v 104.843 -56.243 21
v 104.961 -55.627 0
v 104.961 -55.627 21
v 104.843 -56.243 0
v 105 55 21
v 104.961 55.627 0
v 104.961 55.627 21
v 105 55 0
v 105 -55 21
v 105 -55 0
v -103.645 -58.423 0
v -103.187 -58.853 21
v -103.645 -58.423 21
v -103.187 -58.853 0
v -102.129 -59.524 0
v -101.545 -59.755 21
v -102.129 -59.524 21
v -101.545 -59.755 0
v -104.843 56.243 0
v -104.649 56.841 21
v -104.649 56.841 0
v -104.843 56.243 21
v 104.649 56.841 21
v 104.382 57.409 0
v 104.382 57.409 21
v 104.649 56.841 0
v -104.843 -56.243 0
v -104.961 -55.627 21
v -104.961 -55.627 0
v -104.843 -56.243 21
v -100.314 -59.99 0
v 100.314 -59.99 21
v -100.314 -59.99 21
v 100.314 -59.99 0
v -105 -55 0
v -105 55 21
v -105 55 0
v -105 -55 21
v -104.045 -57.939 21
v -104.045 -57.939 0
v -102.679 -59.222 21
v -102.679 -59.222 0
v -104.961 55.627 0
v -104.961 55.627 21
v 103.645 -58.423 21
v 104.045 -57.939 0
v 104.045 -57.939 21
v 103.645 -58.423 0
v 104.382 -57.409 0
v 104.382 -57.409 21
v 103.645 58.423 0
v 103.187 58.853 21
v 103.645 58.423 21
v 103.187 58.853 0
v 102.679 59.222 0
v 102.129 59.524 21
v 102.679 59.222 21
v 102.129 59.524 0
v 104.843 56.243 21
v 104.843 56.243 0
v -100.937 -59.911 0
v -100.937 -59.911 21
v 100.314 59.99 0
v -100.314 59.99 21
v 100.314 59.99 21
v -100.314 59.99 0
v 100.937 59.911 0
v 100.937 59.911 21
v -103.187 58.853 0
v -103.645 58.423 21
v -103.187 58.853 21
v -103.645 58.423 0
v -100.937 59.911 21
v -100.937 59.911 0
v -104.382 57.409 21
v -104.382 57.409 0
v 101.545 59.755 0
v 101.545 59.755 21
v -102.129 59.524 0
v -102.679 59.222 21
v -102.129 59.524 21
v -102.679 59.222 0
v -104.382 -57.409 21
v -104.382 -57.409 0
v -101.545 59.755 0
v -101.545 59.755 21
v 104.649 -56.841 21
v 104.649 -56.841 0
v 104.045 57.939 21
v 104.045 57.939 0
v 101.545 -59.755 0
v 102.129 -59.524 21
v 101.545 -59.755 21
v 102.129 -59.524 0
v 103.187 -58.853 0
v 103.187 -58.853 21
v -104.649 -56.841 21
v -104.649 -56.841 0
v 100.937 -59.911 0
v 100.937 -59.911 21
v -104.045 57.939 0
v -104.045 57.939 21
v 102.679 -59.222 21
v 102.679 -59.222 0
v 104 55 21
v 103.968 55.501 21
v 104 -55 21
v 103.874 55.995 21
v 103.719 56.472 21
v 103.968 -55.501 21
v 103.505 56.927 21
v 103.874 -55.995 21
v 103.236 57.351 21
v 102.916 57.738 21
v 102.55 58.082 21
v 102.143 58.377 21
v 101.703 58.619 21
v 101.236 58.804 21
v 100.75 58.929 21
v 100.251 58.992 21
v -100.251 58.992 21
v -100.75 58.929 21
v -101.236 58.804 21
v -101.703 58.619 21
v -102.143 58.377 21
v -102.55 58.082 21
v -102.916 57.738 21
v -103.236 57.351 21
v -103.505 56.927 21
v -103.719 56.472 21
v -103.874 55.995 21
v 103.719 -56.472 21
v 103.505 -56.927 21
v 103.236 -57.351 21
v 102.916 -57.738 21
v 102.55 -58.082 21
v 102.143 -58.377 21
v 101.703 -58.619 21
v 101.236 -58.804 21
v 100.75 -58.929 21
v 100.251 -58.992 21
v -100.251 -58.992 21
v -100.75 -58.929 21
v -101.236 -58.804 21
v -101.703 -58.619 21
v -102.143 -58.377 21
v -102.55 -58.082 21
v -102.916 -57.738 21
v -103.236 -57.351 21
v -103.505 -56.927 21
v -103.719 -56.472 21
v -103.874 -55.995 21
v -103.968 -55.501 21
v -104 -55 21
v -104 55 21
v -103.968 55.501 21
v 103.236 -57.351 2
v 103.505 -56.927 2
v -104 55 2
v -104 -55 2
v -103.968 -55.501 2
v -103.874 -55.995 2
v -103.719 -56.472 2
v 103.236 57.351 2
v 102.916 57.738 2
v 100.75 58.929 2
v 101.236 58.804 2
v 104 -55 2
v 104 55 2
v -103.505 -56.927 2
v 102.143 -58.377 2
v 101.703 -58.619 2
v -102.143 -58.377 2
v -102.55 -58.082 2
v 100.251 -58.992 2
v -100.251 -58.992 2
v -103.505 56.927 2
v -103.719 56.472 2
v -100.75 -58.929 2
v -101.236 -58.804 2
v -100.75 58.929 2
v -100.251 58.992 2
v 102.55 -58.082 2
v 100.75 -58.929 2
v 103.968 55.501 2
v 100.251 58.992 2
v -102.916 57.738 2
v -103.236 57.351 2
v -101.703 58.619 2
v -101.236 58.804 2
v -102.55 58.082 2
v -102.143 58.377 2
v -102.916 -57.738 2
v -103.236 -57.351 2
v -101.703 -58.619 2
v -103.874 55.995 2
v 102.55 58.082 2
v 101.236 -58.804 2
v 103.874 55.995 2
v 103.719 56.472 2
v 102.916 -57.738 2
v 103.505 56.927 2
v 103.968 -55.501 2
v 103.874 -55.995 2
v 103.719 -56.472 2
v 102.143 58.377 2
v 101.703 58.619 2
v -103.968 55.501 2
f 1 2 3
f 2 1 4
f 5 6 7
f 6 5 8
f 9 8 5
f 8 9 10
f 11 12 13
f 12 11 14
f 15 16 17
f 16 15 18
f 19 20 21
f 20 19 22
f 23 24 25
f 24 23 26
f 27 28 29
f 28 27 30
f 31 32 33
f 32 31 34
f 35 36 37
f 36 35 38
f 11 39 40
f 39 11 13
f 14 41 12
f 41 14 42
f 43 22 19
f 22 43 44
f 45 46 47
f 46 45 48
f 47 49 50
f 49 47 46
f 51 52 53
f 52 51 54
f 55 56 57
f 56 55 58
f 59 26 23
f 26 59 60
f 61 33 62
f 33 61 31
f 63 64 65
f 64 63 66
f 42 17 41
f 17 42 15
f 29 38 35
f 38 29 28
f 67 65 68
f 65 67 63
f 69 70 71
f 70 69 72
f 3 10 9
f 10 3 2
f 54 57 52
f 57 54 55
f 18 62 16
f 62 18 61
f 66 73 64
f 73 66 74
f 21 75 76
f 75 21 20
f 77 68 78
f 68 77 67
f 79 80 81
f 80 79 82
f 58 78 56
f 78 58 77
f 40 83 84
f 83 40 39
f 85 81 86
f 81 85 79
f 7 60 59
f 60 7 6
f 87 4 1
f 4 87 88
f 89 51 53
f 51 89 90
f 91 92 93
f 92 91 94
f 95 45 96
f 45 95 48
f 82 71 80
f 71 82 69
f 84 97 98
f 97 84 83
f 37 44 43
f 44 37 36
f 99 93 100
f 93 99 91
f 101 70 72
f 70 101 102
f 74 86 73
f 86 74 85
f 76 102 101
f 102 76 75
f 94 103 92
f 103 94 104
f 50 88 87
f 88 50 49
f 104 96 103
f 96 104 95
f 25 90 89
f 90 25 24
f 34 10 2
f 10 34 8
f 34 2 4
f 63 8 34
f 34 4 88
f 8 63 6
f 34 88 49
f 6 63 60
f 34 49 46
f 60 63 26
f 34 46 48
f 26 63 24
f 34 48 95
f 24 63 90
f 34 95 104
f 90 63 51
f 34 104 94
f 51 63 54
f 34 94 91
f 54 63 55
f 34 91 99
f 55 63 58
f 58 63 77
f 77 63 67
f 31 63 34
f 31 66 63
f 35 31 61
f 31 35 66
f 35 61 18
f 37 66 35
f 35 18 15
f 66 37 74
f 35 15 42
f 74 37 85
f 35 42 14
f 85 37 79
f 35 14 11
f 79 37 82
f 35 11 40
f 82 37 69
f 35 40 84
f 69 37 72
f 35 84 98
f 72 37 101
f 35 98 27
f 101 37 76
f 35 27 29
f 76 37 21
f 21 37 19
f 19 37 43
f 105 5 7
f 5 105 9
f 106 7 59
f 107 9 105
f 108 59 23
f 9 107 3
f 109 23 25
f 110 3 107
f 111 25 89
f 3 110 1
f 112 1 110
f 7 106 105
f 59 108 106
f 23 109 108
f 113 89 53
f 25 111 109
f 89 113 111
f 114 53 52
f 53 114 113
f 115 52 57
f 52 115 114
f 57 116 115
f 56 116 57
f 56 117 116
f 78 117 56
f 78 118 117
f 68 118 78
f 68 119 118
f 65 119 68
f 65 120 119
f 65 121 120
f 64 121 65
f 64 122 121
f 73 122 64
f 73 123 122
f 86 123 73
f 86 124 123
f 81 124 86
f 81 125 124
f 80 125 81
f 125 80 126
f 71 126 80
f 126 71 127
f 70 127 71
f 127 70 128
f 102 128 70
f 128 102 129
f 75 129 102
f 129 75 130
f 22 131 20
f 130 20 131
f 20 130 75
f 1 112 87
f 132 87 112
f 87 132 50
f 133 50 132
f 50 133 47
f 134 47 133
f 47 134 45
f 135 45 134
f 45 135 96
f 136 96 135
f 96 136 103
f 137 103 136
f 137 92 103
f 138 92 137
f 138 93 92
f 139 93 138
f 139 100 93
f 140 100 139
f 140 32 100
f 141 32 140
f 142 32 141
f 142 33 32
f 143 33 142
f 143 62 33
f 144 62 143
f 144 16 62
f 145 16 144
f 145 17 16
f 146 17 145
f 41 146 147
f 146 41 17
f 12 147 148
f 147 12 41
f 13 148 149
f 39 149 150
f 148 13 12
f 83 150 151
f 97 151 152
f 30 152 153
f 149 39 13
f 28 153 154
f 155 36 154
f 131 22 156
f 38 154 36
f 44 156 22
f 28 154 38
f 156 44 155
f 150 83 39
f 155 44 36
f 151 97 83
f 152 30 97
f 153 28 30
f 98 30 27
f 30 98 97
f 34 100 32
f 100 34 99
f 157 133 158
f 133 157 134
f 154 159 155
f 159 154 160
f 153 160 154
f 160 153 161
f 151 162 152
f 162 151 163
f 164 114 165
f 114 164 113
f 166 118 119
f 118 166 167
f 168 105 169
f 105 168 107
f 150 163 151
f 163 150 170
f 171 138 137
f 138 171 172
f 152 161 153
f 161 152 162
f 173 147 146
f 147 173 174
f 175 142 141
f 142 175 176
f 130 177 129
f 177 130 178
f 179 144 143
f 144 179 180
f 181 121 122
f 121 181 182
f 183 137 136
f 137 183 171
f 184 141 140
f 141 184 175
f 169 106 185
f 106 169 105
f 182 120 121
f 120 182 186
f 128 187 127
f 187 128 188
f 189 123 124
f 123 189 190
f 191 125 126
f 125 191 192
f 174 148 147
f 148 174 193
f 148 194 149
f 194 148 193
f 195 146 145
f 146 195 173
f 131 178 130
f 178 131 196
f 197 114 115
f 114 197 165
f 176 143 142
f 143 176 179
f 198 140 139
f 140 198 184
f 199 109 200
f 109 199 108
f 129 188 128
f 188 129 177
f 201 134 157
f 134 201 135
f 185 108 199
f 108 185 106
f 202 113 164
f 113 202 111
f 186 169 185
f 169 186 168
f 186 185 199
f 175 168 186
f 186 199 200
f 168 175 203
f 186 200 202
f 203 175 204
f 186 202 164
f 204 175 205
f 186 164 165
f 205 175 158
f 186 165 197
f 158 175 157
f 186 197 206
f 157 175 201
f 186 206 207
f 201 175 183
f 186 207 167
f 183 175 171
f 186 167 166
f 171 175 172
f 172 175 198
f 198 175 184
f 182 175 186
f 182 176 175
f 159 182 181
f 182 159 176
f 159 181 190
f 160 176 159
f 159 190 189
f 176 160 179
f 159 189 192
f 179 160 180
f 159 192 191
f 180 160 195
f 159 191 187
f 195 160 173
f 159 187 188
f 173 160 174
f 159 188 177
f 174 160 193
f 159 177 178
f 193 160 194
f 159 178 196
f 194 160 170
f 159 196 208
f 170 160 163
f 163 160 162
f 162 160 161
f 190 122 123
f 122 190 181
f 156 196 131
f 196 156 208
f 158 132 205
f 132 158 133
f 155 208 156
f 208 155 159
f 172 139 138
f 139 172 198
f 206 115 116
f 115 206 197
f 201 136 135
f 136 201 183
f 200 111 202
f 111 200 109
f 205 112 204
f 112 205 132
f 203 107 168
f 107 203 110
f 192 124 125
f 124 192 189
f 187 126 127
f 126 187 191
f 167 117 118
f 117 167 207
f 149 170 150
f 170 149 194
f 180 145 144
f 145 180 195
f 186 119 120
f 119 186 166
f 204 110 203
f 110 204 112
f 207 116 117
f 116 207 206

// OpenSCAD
$fn = 50;


difference() {
	union() {
		hull() {
			translate(v = [-100.0000000000, 55.0000000000, 0]) {
				cylinder(h = 21, r = 5);
			}
			translate(v = [100.0000000000, 55.0000000000, 0]) {
				cylinder(h = 21, r = 5);
			}
			translate(v = [-100.0000000000, -55.0000000000, 0]) {
				cylinder(h = 21, r = 5);
			}
			translate(v = [100.0000000000, -55.0000000000, 0]) {
				cylinder(h = 21, r = 5);
			}
		}
	}
	union() {
		translate(v = [0, 0, 2]) {
			hull() {
				translate(v = [-100.0000000000, 55.0000000000, 0]) {
					cylinder(h = 19, r = 4);
				}
				translate(v = [100.0000000000, 55.0000000000, 0]) {
					cylinder(h = 19, r = 4);
				}
				translate(v = [-100.0000000000, -55.0000000000, 0]) {
					cylinder(h = 19, r = 4);
				}
				translate(v = [100.0000000000, -55.0000000000, 0]) {
					cylinder(h = 19, r = 4);
				}
			}
		}
	}
}
